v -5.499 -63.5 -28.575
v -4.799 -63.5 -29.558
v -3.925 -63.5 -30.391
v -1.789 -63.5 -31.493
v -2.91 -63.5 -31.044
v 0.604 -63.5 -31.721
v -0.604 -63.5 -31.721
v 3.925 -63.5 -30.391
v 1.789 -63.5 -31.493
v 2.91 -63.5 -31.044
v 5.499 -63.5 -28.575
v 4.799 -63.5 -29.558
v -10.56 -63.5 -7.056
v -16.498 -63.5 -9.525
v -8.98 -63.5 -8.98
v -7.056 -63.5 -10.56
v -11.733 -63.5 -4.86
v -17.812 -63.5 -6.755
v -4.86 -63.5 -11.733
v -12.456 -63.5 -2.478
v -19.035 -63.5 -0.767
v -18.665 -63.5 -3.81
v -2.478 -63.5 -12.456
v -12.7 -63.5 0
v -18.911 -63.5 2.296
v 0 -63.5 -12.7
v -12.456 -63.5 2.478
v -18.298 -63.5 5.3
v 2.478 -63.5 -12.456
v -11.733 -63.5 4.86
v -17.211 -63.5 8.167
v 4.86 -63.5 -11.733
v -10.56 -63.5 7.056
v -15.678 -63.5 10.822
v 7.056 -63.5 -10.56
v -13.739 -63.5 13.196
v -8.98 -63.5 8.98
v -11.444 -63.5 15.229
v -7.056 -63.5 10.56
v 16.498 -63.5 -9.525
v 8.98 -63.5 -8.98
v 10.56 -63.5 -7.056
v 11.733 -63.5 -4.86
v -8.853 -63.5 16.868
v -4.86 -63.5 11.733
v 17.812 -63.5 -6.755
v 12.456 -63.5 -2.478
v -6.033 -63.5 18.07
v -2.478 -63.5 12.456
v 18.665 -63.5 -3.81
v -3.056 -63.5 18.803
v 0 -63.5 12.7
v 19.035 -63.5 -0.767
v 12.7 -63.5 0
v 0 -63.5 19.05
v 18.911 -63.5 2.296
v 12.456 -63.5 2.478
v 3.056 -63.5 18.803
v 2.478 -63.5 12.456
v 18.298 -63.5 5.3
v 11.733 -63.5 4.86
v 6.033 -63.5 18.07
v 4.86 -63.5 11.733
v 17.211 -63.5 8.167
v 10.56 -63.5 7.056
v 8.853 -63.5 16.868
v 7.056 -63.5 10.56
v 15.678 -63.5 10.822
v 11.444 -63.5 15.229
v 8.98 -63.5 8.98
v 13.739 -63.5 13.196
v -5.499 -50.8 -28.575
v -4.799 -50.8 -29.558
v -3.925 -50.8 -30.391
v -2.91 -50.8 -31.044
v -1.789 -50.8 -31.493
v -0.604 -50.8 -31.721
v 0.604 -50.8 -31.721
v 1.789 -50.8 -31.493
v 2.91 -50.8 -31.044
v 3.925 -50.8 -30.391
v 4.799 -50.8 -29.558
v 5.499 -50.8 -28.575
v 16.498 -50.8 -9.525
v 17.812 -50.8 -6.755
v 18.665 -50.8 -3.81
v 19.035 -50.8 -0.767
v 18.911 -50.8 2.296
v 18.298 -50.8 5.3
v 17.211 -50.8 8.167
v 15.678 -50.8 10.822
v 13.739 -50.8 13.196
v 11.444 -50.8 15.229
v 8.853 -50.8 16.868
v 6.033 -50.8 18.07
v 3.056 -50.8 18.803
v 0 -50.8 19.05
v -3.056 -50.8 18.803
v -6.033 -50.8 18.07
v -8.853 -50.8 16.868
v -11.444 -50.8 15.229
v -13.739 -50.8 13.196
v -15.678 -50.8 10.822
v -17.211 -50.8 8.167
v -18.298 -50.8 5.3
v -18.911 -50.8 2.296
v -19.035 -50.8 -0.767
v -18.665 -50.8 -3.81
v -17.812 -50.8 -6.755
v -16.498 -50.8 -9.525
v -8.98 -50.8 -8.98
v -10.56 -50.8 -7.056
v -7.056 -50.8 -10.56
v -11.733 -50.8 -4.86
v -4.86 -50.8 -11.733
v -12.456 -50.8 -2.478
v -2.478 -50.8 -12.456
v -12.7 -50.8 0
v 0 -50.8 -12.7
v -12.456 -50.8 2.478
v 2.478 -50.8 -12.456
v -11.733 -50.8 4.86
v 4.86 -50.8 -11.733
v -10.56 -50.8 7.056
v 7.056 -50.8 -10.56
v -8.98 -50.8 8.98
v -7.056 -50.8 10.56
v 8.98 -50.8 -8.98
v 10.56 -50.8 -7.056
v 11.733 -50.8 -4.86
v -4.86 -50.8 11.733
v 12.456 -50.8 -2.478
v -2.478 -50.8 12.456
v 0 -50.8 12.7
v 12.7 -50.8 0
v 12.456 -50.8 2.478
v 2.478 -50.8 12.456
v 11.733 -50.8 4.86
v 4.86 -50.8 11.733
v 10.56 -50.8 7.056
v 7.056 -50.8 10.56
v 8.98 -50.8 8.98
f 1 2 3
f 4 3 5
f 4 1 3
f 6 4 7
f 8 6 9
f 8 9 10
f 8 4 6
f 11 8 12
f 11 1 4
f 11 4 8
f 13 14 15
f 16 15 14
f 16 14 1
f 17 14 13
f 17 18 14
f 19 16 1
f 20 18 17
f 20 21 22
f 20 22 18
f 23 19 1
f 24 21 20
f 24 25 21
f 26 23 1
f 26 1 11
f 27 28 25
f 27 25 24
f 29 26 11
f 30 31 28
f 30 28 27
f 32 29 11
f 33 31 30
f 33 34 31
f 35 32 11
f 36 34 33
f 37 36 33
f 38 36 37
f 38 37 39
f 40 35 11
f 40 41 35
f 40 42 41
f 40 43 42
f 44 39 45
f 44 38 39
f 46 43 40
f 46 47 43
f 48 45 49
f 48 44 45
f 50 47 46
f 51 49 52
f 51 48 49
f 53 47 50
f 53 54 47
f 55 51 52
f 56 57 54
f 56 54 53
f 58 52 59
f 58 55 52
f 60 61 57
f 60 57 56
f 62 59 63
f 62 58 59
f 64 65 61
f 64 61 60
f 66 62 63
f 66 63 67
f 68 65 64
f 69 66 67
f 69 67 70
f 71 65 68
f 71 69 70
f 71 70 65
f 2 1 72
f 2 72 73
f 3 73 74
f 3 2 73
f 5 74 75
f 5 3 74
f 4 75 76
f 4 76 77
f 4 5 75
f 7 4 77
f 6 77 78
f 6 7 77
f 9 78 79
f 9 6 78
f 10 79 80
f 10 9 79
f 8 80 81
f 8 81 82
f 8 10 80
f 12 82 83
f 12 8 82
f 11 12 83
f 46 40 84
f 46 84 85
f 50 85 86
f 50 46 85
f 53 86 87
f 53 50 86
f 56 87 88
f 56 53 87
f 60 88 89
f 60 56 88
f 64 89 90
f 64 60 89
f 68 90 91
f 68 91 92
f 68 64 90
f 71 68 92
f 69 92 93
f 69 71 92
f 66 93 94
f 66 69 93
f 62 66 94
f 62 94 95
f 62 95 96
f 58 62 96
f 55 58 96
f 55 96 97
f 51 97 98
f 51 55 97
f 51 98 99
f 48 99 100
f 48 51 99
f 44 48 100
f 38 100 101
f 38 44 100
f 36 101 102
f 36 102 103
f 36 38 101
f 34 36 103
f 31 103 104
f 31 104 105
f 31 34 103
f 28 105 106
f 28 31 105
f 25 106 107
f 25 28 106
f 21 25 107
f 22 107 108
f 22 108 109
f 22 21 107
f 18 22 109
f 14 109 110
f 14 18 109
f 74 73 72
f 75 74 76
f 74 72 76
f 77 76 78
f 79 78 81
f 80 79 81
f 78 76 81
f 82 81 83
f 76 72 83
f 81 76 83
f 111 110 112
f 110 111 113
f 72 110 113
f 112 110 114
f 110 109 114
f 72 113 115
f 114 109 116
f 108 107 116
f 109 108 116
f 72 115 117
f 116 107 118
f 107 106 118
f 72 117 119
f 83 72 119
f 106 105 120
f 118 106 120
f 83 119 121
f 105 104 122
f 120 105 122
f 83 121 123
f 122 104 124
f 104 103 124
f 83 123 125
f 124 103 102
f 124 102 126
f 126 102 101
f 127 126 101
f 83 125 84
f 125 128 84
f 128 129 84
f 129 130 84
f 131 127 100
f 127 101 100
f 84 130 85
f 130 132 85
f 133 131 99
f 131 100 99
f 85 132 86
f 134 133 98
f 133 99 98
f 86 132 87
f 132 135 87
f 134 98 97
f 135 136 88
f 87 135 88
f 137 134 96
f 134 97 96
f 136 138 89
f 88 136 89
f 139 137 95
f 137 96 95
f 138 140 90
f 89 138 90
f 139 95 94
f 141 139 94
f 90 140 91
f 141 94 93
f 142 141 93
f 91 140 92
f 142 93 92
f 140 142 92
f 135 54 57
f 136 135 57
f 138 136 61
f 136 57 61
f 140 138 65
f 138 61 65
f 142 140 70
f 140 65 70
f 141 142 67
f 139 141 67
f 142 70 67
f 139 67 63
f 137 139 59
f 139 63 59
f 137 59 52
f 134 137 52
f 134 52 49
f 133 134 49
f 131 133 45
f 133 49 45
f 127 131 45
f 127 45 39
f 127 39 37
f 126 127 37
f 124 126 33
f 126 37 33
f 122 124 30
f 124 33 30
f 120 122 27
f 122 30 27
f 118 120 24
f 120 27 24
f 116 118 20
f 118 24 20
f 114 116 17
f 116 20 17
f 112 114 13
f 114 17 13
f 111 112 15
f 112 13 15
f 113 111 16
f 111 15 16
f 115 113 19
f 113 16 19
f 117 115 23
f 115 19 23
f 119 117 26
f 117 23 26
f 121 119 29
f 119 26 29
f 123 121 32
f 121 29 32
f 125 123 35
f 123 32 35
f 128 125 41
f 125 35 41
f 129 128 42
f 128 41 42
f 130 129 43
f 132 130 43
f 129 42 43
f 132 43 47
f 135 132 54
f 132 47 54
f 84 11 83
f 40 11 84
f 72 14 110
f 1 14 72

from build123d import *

# Parameters (mm, degrees)
F1_R     = 12.7
F2_DEPTH = 12.7


with BuildPart() as f2:
    # F1 (on offset) → F2 (new body)
    with BuildSketch(Plane.XZ.offset(63.5)):
        with BuildLine():
            Line((5.499261, -28.575), (16.497784, -9.525))
            ThreePointArc((16.497784, -9.525), (0, 19.05), (-16.497784, -9.525))
            Line((-16.497784, -9.525), (-5.499261, -28.575))
            ThreePointArc((-5.499261, -28.575), (0, -31.75), (5.499261, -28.575))
        make_face()
        Circle(F1_R, mode=Mode.SUBTRACT)
    extrude(amount=-F2_DEPTH)


solid = f2.part
